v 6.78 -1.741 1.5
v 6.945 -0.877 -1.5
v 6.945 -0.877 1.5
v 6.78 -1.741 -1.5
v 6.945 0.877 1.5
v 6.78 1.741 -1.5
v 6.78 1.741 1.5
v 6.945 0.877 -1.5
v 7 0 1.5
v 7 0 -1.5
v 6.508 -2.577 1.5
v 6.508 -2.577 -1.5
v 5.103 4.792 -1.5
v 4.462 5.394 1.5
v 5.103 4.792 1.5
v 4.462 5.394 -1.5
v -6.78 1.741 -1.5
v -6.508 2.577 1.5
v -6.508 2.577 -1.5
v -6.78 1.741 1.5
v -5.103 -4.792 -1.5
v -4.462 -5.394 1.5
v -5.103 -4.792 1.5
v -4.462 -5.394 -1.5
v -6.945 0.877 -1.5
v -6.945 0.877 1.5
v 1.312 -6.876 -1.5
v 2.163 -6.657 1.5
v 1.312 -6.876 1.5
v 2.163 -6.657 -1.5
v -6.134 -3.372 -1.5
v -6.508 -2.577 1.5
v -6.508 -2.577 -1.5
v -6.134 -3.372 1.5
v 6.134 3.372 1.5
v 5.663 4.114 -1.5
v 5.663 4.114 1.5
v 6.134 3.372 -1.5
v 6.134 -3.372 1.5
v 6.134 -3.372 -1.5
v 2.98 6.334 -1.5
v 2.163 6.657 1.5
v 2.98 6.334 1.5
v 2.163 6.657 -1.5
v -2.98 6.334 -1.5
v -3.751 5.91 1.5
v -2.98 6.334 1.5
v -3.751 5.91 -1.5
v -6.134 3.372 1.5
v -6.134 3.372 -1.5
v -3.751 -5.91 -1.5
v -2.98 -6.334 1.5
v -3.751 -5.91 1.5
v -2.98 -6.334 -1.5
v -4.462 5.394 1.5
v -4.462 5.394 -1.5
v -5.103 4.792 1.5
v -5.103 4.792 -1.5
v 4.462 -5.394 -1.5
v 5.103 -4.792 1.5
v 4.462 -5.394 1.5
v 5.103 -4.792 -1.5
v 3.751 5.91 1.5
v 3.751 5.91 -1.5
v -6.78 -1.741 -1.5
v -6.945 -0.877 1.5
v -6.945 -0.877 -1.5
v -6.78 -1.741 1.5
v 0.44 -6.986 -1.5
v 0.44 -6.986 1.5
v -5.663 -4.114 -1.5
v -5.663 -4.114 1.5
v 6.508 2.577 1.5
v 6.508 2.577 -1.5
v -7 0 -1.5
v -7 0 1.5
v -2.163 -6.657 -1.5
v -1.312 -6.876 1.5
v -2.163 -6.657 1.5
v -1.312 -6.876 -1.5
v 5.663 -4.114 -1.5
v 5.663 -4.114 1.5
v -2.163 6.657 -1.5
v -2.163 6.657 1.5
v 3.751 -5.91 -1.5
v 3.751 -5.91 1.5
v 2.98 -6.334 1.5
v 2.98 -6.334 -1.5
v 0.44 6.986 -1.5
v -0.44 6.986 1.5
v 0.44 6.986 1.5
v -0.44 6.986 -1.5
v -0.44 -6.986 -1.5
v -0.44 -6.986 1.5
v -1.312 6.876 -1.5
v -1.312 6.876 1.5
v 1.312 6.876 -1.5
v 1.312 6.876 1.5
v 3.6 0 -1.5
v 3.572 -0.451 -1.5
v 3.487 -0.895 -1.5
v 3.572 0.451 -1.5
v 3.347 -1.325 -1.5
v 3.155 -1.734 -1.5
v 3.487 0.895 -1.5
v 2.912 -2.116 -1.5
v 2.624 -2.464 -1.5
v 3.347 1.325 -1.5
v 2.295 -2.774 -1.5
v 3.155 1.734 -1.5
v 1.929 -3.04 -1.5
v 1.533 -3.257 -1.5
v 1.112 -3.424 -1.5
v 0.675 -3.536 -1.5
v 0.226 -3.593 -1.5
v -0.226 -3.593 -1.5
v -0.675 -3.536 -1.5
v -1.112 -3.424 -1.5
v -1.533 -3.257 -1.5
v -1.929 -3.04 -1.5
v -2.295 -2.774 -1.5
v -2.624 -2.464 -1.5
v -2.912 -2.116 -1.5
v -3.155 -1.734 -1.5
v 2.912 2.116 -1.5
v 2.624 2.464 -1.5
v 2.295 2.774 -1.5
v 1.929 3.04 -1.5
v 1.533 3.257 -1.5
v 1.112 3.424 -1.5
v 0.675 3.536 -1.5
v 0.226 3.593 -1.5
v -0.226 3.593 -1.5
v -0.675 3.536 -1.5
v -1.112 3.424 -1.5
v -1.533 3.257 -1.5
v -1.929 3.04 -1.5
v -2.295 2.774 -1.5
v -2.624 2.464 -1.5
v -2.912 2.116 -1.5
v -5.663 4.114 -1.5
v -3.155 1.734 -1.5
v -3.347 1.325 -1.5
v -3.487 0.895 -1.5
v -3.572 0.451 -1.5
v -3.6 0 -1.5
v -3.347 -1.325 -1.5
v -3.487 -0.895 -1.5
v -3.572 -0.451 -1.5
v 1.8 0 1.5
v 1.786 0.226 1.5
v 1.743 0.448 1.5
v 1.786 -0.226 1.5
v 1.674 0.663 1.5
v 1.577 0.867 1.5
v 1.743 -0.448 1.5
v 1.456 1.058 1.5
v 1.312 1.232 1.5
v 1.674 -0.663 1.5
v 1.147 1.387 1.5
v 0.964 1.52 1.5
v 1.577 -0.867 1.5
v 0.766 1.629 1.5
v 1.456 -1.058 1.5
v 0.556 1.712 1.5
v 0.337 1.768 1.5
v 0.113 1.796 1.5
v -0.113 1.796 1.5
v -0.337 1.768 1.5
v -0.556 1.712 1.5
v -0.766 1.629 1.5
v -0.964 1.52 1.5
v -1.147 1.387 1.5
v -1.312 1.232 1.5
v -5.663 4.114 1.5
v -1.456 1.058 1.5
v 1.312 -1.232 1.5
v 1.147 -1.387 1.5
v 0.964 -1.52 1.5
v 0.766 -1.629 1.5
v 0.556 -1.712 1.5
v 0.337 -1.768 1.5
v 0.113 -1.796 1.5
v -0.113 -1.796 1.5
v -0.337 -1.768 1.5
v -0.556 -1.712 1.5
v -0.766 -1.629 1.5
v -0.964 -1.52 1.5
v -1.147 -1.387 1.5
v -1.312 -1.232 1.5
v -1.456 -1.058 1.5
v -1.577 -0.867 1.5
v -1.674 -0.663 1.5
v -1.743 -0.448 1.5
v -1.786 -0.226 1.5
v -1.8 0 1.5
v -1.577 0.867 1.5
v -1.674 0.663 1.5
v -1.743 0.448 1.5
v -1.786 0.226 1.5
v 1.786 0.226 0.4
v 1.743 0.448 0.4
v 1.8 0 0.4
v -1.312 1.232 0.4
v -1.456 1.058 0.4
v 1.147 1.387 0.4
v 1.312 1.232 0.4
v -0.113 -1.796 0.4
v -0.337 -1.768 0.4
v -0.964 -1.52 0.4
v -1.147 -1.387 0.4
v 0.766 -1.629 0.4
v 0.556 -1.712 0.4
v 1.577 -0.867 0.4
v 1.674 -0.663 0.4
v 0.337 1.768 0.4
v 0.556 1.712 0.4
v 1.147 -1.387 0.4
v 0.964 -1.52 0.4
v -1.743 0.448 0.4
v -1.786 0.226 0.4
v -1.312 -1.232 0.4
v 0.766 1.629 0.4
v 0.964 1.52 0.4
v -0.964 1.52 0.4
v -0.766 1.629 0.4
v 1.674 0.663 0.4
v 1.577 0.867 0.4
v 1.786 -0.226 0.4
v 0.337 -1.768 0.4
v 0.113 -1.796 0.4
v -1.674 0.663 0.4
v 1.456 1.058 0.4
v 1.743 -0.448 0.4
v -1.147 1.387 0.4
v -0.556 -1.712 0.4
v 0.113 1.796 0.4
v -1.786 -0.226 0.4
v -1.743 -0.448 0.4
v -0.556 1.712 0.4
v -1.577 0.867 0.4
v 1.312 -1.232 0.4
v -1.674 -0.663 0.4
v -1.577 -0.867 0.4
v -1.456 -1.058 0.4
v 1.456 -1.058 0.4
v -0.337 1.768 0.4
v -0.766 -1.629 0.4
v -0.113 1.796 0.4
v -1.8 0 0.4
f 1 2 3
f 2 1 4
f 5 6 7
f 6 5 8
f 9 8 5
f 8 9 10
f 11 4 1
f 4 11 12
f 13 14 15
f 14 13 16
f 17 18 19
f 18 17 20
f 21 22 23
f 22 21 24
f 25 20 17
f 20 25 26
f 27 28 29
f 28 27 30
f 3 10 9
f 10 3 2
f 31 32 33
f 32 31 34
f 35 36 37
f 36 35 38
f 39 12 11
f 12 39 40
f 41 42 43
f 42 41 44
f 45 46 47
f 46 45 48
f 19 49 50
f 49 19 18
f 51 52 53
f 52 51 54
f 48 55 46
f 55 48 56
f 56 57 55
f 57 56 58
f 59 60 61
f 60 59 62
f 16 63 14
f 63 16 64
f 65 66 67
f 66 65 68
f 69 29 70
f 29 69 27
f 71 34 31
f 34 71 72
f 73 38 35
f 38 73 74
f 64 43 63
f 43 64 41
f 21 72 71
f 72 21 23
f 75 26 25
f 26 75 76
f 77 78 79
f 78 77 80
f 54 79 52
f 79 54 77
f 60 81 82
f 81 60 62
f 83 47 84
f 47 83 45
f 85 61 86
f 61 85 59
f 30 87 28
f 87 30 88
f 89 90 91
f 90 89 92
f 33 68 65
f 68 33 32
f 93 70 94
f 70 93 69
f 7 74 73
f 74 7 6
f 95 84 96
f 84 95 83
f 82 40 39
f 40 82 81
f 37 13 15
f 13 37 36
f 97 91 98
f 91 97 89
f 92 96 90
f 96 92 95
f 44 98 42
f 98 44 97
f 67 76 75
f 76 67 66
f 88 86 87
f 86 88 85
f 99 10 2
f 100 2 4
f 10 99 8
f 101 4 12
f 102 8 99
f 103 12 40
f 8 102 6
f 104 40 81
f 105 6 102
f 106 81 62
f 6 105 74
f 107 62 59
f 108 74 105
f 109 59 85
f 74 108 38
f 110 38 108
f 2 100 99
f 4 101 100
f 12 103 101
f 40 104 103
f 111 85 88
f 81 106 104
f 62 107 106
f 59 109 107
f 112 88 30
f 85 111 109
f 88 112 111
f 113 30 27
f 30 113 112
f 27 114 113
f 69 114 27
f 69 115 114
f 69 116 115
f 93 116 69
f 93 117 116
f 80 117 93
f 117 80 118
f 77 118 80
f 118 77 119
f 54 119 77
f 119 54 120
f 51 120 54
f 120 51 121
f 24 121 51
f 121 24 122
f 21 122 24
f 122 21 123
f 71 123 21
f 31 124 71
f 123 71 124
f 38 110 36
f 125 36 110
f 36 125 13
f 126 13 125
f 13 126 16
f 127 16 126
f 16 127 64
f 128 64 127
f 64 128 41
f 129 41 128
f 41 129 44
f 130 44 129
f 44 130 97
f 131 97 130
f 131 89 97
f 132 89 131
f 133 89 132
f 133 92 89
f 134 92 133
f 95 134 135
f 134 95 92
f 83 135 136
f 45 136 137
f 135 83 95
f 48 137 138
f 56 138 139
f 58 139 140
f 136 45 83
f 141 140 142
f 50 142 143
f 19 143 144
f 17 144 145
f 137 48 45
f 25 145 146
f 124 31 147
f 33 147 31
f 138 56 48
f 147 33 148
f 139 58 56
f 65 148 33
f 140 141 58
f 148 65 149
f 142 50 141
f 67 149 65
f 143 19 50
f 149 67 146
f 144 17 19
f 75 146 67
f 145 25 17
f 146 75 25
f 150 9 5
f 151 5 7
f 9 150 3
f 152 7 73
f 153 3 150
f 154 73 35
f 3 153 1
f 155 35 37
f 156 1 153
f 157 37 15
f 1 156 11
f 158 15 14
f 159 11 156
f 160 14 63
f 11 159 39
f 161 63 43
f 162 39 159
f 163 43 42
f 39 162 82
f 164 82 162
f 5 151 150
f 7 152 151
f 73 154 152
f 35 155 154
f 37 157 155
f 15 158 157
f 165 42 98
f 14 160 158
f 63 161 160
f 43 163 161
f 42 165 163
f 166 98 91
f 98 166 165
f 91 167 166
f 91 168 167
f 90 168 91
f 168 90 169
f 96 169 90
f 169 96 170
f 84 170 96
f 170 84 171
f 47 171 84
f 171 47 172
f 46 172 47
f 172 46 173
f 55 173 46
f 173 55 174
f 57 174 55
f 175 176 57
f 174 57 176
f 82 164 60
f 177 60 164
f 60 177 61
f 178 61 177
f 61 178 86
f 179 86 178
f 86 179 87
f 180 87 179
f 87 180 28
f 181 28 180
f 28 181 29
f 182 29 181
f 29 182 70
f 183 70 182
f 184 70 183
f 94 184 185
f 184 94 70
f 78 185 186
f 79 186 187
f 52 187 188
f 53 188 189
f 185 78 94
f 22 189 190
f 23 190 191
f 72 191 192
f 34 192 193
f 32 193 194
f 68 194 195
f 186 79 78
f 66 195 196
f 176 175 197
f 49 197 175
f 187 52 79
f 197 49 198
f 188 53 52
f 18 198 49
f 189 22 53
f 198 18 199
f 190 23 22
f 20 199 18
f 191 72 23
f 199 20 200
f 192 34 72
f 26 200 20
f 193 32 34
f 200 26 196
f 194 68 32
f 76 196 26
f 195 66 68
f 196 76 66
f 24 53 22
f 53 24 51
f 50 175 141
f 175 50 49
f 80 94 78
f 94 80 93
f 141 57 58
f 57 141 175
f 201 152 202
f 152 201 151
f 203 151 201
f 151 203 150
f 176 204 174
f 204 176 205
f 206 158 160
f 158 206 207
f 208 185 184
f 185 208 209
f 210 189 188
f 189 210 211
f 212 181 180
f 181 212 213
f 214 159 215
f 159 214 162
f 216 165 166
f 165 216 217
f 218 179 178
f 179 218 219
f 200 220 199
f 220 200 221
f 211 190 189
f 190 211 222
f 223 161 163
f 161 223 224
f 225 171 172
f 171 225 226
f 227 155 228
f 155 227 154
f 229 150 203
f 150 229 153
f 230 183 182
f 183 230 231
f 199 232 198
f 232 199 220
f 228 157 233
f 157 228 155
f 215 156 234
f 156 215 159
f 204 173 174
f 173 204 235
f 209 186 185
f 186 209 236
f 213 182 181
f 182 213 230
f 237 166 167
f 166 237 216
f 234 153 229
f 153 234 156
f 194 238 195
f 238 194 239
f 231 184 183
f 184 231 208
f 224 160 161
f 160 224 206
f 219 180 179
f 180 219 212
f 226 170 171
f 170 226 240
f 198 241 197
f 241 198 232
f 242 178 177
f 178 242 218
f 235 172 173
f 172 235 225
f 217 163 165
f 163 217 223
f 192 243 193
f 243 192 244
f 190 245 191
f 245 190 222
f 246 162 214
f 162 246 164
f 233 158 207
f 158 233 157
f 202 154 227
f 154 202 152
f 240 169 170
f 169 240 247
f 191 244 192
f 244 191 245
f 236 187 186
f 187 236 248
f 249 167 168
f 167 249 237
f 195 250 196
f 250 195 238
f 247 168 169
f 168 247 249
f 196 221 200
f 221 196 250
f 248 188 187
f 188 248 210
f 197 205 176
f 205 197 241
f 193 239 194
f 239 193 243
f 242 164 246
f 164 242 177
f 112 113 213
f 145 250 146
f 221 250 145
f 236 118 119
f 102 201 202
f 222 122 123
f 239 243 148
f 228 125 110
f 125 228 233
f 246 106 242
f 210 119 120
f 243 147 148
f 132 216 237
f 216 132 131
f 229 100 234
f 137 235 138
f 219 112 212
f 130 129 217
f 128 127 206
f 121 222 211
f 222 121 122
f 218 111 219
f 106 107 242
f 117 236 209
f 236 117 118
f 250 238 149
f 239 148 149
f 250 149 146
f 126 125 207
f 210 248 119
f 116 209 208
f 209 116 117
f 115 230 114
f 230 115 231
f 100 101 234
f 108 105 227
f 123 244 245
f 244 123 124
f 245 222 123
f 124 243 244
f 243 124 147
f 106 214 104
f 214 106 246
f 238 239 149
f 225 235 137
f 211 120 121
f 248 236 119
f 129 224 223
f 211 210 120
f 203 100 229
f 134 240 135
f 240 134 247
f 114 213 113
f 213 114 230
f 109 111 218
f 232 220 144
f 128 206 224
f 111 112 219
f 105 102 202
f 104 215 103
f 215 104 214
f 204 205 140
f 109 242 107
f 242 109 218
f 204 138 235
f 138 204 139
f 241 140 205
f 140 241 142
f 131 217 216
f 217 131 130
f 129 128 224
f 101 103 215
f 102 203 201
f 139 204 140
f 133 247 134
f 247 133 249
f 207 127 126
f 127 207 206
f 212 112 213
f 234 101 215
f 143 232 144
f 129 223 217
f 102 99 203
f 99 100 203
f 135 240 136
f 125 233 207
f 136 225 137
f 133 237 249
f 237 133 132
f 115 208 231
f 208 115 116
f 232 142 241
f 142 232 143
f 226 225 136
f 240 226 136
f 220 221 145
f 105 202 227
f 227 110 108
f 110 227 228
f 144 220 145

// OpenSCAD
$fn = 50;


difference() {
	union() {
		translate(v = [0, 0, -1.5000000000]) {
			rotate(a = [0, 0, 0]) {
				cylinder(h = 3, r = 7.0000000000);
			}
		}
		translate(v = [0, 0, -1.5000000000]) {
			rotate(a = [0, 0, 0]) {
				cylinder(h = 3, r = 2.8500000000);
			}
		}
	}
	union() {
		translate(v = [0, 0, -125.0000000000]) {
			rotate(a = [0, 0, 0]) {
				cylinder(h = 250, r = 1.8000000000);
			}
		}
		#translate(v = [0, 0, 0.4000000000]) {
			rotate(a = [0, 180, 0]) {
				cylinder(h = 1.9000000000, r1 = 1.8000000000, r2 = 3.6000000000);
			}
		}
		#translate(v = [0, 0, 1.5000000000]) {
			rotate(a = [0, 180, 0]) {
				cylinder(h = 3, r = 1.8000000000);
			}
		}
	}
}
